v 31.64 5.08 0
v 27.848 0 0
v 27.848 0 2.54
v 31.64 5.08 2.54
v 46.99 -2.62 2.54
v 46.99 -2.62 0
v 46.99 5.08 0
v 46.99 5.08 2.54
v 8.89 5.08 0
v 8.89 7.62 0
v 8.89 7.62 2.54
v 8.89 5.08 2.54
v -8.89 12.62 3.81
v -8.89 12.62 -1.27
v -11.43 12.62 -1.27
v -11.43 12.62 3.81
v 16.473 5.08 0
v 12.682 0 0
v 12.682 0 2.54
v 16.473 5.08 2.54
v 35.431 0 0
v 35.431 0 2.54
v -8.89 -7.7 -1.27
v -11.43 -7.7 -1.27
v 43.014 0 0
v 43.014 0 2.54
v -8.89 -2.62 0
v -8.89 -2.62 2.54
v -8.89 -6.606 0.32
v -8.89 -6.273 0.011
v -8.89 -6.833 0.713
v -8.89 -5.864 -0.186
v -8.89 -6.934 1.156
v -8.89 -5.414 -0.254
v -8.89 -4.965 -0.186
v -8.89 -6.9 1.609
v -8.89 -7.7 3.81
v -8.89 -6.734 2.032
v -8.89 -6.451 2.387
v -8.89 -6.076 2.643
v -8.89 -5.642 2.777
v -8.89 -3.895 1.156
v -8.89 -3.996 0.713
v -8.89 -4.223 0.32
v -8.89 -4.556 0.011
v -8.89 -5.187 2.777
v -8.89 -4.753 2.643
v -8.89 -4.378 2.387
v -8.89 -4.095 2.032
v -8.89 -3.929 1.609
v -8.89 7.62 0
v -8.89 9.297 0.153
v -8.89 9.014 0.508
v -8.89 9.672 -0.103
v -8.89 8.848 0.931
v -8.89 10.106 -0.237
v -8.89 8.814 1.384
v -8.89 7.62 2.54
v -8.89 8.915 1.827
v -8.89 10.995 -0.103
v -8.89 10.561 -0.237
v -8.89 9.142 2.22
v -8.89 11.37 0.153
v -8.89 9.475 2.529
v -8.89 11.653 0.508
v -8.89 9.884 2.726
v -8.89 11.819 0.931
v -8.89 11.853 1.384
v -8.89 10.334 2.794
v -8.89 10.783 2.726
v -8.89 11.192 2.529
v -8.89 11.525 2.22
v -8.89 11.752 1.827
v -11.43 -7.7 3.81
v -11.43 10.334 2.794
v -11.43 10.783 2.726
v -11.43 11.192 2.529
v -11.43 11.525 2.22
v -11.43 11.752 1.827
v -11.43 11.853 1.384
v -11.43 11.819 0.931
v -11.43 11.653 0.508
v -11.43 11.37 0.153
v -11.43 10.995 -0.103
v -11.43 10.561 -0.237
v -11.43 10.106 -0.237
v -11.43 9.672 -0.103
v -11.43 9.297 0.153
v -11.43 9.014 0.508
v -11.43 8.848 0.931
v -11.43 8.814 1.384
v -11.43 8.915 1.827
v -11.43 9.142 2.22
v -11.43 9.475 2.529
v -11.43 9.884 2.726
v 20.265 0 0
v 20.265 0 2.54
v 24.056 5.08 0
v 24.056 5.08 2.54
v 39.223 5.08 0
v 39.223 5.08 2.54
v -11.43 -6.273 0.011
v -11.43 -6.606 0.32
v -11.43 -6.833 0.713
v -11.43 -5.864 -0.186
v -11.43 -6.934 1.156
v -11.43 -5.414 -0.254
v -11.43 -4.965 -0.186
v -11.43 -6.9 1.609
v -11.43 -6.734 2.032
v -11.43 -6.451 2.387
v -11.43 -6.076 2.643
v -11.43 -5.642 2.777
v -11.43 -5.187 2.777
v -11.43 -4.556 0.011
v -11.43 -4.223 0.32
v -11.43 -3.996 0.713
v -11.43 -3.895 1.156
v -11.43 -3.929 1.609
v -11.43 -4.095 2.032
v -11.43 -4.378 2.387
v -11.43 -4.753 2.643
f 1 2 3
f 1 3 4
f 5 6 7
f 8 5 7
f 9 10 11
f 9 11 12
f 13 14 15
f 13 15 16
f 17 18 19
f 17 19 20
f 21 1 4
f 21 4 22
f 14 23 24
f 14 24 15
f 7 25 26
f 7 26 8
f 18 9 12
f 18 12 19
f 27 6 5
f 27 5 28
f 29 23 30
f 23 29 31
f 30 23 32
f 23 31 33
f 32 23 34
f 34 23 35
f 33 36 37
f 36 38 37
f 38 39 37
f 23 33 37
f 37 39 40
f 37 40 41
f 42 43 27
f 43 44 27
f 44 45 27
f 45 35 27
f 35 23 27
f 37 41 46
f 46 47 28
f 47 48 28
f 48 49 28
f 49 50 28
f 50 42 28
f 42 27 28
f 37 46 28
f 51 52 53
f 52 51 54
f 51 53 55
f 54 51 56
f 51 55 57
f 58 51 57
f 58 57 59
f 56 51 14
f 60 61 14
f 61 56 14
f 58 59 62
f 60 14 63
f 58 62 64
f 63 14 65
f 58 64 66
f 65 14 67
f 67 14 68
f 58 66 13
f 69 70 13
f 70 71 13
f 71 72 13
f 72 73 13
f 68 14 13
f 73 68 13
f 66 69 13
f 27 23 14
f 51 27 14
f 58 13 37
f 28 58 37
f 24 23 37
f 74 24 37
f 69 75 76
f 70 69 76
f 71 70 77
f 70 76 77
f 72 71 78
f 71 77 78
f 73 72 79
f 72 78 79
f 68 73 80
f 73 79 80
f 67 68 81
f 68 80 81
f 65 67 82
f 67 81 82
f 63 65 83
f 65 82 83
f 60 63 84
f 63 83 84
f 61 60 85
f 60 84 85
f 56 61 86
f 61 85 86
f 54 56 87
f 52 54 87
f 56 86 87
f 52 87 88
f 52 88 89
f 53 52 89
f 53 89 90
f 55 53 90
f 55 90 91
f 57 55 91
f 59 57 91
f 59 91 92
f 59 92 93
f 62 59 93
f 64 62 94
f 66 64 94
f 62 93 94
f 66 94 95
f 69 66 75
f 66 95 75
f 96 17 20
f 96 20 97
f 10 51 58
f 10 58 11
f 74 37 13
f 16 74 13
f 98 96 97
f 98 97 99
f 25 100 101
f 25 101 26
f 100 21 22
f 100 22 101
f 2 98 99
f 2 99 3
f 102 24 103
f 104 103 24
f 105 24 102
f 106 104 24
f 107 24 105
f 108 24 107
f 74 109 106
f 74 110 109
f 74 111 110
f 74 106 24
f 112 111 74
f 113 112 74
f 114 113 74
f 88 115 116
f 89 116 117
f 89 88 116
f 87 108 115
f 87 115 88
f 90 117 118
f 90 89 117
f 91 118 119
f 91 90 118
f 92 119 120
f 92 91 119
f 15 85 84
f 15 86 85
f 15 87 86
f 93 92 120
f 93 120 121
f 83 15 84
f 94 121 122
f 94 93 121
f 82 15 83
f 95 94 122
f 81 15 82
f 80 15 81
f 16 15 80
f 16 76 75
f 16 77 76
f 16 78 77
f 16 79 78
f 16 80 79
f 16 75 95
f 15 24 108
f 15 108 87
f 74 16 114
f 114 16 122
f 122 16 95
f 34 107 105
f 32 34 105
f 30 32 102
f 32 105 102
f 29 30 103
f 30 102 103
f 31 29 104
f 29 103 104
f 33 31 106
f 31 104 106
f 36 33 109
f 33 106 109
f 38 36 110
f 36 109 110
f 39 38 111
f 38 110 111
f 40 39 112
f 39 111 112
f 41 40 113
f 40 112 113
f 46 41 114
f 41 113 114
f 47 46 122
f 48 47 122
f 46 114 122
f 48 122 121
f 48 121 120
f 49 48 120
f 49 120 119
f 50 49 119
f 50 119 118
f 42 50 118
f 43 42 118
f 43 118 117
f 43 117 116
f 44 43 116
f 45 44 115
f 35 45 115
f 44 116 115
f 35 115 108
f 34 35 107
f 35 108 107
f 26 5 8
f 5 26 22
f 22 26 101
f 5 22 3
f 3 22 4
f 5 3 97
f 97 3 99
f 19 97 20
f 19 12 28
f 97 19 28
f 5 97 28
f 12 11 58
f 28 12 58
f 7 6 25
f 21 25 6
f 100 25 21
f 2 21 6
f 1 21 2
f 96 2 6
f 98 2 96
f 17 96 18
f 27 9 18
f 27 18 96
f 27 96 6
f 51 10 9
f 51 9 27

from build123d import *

# Parameters (mm, degrees)
BOSS_EXTRUDE1_DEPTH = 2.54
SKETCH2_W           = 5.08
SKETCH2_H           = 20.32
BOSS_EXTRUDE2_DEPTH = 2.54
SKETCH3_R           = 1.524
CUT_EXTRUDE1_DEPTH  = 2.54


with BuildPart() as part:
    # Sketch1 → Boss-Extrude1 (new body)
    with BuildSketch(Plane.XY):
        Polygon((-8.89, 0), (-8.89, 7.62), (8.89, 7.62), (8.89, 5.08), (12.681599437, 0), (16.473198875, 5.08), (20.264798312, 0), (24.056397749, 5.08), (27.847997187, 0), (31.639596624, 5.08), (35.431196061, 0), (39.222795499, 5.08), (43.014394936, 0), (46.99, 5.08), (46.99, 0), (46.99, -2.620396656), (-8.89, -2.620396656), align=None)
    extrude(amount=BOSS_EXTRUDE1_DEPTH)

    # Sketch2 → Boss-Extrude2 (add)
    with BuildSketch(Plane.ZY.offset(8.89)):
        with Locations((1.27, 2.459603344)):
            Rectangle(SKETCH2_W, SKETCH2_H)
    extrude(amount=BOSS_EXTRUDE2_DEPTH)

    # Sketch3 → Cut-Extrude1 (cut)
    with BuildSketch(Plane.ZY.offset(11.43)):
        with Locations((1.27, 10.333603344)):
            Circle(SKETCH3_R)
        with Locations(Location((1.27, -5.414396656, 0), (0, 0, 180))):
            Circle(SKETCH3_R)
    extrude(amount=-CUT_EXTRUDE1_DEPTH, mode=Mode.SUBTRACT)


solid = part.part
